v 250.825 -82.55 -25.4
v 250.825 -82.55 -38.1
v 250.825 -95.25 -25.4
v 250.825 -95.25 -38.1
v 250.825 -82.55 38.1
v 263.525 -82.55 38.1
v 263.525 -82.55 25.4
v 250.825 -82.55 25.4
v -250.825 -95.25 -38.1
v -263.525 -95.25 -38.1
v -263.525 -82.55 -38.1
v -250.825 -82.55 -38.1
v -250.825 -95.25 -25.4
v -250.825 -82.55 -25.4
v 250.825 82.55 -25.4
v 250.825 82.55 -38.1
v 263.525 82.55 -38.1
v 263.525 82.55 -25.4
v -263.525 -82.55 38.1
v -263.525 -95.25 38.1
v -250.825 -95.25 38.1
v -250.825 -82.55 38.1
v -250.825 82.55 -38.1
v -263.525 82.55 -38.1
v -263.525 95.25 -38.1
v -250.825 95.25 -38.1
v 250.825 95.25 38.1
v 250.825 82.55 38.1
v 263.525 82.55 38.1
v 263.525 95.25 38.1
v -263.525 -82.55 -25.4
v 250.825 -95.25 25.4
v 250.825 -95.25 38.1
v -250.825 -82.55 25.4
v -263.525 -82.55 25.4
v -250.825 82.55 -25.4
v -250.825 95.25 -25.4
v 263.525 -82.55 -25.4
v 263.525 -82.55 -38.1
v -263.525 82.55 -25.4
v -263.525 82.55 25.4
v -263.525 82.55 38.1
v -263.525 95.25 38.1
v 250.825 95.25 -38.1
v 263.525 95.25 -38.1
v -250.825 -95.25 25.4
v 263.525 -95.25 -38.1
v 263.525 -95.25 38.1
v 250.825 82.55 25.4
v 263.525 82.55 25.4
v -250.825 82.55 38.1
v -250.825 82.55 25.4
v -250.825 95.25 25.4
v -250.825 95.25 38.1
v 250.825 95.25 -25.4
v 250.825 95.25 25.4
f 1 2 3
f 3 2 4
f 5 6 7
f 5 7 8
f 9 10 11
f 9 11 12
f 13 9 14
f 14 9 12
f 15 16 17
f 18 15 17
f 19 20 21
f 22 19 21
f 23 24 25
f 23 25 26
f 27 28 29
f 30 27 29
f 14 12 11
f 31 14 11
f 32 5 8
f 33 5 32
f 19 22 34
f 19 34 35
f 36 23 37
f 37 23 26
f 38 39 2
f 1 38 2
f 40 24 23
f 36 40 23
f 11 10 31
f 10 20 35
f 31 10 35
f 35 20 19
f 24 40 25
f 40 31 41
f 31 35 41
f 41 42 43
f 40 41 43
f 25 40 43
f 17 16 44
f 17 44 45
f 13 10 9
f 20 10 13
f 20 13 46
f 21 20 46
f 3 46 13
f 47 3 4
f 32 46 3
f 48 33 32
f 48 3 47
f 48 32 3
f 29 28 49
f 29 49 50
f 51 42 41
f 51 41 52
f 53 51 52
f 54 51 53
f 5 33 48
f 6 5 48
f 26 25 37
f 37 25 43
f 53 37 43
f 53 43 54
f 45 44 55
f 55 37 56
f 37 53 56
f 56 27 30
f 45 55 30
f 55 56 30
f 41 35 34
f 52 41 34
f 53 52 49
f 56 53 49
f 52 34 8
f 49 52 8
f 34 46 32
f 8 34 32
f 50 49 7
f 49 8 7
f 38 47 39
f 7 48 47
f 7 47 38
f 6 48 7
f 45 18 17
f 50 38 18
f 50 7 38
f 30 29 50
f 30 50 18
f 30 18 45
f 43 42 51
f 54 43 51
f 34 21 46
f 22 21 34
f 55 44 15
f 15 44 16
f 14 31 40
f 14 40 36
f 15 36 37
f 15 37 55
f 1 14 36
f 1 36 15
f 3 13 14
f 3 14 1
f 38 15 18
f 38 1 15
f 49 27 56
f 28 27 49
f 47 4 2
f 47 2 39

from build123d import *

# Parameters (mm, degrees)
F0_W     = 527.05
F0_H     = 190.5
F1_DEPTH = 38.1
F3_DEPTH = 12.7


# Not quite as in the source:
# - a pattern or mirror of a feature is missing from the dataset's text; its kind, count and spacing are read off the source's solid


with BuildPart() as f1:
    # F0 (on Top) → F1 (new body, symmetric)
    with BuildSketch(Plane.XY):
        Rectangle(F0_W, F0_H)
    extrude(amount=F1_DEPTH, both=True)

    # F2 (on face) → F3 (cut)
    with BuildSketch(Plane(origin=(0, 0, -38.1), x_dir=(1, 0, 0), z_dir=(0, 0, -1))):
        Polygon((250.825, 95.25), (-250.825, 95.25), (-250.825, 82.55), (-263.525, 82.55), (-263.525, -82.55), (-250.825, -82.55), (-250.825, -95.25), (250.825, -95.25), (250.825, -82.55), (263.525, -82.55), (263.525, 82.55), (250.825, 82.55), align=None)
    f3 = extrude(amount=-F3_DEPTH, mode=Mode.SUBTRACT)

    # F3_copies: F3 across plane
    add(f3.mirror(Plane.XY), mode=Mode.SUBTRACT)


solid = f1.part
